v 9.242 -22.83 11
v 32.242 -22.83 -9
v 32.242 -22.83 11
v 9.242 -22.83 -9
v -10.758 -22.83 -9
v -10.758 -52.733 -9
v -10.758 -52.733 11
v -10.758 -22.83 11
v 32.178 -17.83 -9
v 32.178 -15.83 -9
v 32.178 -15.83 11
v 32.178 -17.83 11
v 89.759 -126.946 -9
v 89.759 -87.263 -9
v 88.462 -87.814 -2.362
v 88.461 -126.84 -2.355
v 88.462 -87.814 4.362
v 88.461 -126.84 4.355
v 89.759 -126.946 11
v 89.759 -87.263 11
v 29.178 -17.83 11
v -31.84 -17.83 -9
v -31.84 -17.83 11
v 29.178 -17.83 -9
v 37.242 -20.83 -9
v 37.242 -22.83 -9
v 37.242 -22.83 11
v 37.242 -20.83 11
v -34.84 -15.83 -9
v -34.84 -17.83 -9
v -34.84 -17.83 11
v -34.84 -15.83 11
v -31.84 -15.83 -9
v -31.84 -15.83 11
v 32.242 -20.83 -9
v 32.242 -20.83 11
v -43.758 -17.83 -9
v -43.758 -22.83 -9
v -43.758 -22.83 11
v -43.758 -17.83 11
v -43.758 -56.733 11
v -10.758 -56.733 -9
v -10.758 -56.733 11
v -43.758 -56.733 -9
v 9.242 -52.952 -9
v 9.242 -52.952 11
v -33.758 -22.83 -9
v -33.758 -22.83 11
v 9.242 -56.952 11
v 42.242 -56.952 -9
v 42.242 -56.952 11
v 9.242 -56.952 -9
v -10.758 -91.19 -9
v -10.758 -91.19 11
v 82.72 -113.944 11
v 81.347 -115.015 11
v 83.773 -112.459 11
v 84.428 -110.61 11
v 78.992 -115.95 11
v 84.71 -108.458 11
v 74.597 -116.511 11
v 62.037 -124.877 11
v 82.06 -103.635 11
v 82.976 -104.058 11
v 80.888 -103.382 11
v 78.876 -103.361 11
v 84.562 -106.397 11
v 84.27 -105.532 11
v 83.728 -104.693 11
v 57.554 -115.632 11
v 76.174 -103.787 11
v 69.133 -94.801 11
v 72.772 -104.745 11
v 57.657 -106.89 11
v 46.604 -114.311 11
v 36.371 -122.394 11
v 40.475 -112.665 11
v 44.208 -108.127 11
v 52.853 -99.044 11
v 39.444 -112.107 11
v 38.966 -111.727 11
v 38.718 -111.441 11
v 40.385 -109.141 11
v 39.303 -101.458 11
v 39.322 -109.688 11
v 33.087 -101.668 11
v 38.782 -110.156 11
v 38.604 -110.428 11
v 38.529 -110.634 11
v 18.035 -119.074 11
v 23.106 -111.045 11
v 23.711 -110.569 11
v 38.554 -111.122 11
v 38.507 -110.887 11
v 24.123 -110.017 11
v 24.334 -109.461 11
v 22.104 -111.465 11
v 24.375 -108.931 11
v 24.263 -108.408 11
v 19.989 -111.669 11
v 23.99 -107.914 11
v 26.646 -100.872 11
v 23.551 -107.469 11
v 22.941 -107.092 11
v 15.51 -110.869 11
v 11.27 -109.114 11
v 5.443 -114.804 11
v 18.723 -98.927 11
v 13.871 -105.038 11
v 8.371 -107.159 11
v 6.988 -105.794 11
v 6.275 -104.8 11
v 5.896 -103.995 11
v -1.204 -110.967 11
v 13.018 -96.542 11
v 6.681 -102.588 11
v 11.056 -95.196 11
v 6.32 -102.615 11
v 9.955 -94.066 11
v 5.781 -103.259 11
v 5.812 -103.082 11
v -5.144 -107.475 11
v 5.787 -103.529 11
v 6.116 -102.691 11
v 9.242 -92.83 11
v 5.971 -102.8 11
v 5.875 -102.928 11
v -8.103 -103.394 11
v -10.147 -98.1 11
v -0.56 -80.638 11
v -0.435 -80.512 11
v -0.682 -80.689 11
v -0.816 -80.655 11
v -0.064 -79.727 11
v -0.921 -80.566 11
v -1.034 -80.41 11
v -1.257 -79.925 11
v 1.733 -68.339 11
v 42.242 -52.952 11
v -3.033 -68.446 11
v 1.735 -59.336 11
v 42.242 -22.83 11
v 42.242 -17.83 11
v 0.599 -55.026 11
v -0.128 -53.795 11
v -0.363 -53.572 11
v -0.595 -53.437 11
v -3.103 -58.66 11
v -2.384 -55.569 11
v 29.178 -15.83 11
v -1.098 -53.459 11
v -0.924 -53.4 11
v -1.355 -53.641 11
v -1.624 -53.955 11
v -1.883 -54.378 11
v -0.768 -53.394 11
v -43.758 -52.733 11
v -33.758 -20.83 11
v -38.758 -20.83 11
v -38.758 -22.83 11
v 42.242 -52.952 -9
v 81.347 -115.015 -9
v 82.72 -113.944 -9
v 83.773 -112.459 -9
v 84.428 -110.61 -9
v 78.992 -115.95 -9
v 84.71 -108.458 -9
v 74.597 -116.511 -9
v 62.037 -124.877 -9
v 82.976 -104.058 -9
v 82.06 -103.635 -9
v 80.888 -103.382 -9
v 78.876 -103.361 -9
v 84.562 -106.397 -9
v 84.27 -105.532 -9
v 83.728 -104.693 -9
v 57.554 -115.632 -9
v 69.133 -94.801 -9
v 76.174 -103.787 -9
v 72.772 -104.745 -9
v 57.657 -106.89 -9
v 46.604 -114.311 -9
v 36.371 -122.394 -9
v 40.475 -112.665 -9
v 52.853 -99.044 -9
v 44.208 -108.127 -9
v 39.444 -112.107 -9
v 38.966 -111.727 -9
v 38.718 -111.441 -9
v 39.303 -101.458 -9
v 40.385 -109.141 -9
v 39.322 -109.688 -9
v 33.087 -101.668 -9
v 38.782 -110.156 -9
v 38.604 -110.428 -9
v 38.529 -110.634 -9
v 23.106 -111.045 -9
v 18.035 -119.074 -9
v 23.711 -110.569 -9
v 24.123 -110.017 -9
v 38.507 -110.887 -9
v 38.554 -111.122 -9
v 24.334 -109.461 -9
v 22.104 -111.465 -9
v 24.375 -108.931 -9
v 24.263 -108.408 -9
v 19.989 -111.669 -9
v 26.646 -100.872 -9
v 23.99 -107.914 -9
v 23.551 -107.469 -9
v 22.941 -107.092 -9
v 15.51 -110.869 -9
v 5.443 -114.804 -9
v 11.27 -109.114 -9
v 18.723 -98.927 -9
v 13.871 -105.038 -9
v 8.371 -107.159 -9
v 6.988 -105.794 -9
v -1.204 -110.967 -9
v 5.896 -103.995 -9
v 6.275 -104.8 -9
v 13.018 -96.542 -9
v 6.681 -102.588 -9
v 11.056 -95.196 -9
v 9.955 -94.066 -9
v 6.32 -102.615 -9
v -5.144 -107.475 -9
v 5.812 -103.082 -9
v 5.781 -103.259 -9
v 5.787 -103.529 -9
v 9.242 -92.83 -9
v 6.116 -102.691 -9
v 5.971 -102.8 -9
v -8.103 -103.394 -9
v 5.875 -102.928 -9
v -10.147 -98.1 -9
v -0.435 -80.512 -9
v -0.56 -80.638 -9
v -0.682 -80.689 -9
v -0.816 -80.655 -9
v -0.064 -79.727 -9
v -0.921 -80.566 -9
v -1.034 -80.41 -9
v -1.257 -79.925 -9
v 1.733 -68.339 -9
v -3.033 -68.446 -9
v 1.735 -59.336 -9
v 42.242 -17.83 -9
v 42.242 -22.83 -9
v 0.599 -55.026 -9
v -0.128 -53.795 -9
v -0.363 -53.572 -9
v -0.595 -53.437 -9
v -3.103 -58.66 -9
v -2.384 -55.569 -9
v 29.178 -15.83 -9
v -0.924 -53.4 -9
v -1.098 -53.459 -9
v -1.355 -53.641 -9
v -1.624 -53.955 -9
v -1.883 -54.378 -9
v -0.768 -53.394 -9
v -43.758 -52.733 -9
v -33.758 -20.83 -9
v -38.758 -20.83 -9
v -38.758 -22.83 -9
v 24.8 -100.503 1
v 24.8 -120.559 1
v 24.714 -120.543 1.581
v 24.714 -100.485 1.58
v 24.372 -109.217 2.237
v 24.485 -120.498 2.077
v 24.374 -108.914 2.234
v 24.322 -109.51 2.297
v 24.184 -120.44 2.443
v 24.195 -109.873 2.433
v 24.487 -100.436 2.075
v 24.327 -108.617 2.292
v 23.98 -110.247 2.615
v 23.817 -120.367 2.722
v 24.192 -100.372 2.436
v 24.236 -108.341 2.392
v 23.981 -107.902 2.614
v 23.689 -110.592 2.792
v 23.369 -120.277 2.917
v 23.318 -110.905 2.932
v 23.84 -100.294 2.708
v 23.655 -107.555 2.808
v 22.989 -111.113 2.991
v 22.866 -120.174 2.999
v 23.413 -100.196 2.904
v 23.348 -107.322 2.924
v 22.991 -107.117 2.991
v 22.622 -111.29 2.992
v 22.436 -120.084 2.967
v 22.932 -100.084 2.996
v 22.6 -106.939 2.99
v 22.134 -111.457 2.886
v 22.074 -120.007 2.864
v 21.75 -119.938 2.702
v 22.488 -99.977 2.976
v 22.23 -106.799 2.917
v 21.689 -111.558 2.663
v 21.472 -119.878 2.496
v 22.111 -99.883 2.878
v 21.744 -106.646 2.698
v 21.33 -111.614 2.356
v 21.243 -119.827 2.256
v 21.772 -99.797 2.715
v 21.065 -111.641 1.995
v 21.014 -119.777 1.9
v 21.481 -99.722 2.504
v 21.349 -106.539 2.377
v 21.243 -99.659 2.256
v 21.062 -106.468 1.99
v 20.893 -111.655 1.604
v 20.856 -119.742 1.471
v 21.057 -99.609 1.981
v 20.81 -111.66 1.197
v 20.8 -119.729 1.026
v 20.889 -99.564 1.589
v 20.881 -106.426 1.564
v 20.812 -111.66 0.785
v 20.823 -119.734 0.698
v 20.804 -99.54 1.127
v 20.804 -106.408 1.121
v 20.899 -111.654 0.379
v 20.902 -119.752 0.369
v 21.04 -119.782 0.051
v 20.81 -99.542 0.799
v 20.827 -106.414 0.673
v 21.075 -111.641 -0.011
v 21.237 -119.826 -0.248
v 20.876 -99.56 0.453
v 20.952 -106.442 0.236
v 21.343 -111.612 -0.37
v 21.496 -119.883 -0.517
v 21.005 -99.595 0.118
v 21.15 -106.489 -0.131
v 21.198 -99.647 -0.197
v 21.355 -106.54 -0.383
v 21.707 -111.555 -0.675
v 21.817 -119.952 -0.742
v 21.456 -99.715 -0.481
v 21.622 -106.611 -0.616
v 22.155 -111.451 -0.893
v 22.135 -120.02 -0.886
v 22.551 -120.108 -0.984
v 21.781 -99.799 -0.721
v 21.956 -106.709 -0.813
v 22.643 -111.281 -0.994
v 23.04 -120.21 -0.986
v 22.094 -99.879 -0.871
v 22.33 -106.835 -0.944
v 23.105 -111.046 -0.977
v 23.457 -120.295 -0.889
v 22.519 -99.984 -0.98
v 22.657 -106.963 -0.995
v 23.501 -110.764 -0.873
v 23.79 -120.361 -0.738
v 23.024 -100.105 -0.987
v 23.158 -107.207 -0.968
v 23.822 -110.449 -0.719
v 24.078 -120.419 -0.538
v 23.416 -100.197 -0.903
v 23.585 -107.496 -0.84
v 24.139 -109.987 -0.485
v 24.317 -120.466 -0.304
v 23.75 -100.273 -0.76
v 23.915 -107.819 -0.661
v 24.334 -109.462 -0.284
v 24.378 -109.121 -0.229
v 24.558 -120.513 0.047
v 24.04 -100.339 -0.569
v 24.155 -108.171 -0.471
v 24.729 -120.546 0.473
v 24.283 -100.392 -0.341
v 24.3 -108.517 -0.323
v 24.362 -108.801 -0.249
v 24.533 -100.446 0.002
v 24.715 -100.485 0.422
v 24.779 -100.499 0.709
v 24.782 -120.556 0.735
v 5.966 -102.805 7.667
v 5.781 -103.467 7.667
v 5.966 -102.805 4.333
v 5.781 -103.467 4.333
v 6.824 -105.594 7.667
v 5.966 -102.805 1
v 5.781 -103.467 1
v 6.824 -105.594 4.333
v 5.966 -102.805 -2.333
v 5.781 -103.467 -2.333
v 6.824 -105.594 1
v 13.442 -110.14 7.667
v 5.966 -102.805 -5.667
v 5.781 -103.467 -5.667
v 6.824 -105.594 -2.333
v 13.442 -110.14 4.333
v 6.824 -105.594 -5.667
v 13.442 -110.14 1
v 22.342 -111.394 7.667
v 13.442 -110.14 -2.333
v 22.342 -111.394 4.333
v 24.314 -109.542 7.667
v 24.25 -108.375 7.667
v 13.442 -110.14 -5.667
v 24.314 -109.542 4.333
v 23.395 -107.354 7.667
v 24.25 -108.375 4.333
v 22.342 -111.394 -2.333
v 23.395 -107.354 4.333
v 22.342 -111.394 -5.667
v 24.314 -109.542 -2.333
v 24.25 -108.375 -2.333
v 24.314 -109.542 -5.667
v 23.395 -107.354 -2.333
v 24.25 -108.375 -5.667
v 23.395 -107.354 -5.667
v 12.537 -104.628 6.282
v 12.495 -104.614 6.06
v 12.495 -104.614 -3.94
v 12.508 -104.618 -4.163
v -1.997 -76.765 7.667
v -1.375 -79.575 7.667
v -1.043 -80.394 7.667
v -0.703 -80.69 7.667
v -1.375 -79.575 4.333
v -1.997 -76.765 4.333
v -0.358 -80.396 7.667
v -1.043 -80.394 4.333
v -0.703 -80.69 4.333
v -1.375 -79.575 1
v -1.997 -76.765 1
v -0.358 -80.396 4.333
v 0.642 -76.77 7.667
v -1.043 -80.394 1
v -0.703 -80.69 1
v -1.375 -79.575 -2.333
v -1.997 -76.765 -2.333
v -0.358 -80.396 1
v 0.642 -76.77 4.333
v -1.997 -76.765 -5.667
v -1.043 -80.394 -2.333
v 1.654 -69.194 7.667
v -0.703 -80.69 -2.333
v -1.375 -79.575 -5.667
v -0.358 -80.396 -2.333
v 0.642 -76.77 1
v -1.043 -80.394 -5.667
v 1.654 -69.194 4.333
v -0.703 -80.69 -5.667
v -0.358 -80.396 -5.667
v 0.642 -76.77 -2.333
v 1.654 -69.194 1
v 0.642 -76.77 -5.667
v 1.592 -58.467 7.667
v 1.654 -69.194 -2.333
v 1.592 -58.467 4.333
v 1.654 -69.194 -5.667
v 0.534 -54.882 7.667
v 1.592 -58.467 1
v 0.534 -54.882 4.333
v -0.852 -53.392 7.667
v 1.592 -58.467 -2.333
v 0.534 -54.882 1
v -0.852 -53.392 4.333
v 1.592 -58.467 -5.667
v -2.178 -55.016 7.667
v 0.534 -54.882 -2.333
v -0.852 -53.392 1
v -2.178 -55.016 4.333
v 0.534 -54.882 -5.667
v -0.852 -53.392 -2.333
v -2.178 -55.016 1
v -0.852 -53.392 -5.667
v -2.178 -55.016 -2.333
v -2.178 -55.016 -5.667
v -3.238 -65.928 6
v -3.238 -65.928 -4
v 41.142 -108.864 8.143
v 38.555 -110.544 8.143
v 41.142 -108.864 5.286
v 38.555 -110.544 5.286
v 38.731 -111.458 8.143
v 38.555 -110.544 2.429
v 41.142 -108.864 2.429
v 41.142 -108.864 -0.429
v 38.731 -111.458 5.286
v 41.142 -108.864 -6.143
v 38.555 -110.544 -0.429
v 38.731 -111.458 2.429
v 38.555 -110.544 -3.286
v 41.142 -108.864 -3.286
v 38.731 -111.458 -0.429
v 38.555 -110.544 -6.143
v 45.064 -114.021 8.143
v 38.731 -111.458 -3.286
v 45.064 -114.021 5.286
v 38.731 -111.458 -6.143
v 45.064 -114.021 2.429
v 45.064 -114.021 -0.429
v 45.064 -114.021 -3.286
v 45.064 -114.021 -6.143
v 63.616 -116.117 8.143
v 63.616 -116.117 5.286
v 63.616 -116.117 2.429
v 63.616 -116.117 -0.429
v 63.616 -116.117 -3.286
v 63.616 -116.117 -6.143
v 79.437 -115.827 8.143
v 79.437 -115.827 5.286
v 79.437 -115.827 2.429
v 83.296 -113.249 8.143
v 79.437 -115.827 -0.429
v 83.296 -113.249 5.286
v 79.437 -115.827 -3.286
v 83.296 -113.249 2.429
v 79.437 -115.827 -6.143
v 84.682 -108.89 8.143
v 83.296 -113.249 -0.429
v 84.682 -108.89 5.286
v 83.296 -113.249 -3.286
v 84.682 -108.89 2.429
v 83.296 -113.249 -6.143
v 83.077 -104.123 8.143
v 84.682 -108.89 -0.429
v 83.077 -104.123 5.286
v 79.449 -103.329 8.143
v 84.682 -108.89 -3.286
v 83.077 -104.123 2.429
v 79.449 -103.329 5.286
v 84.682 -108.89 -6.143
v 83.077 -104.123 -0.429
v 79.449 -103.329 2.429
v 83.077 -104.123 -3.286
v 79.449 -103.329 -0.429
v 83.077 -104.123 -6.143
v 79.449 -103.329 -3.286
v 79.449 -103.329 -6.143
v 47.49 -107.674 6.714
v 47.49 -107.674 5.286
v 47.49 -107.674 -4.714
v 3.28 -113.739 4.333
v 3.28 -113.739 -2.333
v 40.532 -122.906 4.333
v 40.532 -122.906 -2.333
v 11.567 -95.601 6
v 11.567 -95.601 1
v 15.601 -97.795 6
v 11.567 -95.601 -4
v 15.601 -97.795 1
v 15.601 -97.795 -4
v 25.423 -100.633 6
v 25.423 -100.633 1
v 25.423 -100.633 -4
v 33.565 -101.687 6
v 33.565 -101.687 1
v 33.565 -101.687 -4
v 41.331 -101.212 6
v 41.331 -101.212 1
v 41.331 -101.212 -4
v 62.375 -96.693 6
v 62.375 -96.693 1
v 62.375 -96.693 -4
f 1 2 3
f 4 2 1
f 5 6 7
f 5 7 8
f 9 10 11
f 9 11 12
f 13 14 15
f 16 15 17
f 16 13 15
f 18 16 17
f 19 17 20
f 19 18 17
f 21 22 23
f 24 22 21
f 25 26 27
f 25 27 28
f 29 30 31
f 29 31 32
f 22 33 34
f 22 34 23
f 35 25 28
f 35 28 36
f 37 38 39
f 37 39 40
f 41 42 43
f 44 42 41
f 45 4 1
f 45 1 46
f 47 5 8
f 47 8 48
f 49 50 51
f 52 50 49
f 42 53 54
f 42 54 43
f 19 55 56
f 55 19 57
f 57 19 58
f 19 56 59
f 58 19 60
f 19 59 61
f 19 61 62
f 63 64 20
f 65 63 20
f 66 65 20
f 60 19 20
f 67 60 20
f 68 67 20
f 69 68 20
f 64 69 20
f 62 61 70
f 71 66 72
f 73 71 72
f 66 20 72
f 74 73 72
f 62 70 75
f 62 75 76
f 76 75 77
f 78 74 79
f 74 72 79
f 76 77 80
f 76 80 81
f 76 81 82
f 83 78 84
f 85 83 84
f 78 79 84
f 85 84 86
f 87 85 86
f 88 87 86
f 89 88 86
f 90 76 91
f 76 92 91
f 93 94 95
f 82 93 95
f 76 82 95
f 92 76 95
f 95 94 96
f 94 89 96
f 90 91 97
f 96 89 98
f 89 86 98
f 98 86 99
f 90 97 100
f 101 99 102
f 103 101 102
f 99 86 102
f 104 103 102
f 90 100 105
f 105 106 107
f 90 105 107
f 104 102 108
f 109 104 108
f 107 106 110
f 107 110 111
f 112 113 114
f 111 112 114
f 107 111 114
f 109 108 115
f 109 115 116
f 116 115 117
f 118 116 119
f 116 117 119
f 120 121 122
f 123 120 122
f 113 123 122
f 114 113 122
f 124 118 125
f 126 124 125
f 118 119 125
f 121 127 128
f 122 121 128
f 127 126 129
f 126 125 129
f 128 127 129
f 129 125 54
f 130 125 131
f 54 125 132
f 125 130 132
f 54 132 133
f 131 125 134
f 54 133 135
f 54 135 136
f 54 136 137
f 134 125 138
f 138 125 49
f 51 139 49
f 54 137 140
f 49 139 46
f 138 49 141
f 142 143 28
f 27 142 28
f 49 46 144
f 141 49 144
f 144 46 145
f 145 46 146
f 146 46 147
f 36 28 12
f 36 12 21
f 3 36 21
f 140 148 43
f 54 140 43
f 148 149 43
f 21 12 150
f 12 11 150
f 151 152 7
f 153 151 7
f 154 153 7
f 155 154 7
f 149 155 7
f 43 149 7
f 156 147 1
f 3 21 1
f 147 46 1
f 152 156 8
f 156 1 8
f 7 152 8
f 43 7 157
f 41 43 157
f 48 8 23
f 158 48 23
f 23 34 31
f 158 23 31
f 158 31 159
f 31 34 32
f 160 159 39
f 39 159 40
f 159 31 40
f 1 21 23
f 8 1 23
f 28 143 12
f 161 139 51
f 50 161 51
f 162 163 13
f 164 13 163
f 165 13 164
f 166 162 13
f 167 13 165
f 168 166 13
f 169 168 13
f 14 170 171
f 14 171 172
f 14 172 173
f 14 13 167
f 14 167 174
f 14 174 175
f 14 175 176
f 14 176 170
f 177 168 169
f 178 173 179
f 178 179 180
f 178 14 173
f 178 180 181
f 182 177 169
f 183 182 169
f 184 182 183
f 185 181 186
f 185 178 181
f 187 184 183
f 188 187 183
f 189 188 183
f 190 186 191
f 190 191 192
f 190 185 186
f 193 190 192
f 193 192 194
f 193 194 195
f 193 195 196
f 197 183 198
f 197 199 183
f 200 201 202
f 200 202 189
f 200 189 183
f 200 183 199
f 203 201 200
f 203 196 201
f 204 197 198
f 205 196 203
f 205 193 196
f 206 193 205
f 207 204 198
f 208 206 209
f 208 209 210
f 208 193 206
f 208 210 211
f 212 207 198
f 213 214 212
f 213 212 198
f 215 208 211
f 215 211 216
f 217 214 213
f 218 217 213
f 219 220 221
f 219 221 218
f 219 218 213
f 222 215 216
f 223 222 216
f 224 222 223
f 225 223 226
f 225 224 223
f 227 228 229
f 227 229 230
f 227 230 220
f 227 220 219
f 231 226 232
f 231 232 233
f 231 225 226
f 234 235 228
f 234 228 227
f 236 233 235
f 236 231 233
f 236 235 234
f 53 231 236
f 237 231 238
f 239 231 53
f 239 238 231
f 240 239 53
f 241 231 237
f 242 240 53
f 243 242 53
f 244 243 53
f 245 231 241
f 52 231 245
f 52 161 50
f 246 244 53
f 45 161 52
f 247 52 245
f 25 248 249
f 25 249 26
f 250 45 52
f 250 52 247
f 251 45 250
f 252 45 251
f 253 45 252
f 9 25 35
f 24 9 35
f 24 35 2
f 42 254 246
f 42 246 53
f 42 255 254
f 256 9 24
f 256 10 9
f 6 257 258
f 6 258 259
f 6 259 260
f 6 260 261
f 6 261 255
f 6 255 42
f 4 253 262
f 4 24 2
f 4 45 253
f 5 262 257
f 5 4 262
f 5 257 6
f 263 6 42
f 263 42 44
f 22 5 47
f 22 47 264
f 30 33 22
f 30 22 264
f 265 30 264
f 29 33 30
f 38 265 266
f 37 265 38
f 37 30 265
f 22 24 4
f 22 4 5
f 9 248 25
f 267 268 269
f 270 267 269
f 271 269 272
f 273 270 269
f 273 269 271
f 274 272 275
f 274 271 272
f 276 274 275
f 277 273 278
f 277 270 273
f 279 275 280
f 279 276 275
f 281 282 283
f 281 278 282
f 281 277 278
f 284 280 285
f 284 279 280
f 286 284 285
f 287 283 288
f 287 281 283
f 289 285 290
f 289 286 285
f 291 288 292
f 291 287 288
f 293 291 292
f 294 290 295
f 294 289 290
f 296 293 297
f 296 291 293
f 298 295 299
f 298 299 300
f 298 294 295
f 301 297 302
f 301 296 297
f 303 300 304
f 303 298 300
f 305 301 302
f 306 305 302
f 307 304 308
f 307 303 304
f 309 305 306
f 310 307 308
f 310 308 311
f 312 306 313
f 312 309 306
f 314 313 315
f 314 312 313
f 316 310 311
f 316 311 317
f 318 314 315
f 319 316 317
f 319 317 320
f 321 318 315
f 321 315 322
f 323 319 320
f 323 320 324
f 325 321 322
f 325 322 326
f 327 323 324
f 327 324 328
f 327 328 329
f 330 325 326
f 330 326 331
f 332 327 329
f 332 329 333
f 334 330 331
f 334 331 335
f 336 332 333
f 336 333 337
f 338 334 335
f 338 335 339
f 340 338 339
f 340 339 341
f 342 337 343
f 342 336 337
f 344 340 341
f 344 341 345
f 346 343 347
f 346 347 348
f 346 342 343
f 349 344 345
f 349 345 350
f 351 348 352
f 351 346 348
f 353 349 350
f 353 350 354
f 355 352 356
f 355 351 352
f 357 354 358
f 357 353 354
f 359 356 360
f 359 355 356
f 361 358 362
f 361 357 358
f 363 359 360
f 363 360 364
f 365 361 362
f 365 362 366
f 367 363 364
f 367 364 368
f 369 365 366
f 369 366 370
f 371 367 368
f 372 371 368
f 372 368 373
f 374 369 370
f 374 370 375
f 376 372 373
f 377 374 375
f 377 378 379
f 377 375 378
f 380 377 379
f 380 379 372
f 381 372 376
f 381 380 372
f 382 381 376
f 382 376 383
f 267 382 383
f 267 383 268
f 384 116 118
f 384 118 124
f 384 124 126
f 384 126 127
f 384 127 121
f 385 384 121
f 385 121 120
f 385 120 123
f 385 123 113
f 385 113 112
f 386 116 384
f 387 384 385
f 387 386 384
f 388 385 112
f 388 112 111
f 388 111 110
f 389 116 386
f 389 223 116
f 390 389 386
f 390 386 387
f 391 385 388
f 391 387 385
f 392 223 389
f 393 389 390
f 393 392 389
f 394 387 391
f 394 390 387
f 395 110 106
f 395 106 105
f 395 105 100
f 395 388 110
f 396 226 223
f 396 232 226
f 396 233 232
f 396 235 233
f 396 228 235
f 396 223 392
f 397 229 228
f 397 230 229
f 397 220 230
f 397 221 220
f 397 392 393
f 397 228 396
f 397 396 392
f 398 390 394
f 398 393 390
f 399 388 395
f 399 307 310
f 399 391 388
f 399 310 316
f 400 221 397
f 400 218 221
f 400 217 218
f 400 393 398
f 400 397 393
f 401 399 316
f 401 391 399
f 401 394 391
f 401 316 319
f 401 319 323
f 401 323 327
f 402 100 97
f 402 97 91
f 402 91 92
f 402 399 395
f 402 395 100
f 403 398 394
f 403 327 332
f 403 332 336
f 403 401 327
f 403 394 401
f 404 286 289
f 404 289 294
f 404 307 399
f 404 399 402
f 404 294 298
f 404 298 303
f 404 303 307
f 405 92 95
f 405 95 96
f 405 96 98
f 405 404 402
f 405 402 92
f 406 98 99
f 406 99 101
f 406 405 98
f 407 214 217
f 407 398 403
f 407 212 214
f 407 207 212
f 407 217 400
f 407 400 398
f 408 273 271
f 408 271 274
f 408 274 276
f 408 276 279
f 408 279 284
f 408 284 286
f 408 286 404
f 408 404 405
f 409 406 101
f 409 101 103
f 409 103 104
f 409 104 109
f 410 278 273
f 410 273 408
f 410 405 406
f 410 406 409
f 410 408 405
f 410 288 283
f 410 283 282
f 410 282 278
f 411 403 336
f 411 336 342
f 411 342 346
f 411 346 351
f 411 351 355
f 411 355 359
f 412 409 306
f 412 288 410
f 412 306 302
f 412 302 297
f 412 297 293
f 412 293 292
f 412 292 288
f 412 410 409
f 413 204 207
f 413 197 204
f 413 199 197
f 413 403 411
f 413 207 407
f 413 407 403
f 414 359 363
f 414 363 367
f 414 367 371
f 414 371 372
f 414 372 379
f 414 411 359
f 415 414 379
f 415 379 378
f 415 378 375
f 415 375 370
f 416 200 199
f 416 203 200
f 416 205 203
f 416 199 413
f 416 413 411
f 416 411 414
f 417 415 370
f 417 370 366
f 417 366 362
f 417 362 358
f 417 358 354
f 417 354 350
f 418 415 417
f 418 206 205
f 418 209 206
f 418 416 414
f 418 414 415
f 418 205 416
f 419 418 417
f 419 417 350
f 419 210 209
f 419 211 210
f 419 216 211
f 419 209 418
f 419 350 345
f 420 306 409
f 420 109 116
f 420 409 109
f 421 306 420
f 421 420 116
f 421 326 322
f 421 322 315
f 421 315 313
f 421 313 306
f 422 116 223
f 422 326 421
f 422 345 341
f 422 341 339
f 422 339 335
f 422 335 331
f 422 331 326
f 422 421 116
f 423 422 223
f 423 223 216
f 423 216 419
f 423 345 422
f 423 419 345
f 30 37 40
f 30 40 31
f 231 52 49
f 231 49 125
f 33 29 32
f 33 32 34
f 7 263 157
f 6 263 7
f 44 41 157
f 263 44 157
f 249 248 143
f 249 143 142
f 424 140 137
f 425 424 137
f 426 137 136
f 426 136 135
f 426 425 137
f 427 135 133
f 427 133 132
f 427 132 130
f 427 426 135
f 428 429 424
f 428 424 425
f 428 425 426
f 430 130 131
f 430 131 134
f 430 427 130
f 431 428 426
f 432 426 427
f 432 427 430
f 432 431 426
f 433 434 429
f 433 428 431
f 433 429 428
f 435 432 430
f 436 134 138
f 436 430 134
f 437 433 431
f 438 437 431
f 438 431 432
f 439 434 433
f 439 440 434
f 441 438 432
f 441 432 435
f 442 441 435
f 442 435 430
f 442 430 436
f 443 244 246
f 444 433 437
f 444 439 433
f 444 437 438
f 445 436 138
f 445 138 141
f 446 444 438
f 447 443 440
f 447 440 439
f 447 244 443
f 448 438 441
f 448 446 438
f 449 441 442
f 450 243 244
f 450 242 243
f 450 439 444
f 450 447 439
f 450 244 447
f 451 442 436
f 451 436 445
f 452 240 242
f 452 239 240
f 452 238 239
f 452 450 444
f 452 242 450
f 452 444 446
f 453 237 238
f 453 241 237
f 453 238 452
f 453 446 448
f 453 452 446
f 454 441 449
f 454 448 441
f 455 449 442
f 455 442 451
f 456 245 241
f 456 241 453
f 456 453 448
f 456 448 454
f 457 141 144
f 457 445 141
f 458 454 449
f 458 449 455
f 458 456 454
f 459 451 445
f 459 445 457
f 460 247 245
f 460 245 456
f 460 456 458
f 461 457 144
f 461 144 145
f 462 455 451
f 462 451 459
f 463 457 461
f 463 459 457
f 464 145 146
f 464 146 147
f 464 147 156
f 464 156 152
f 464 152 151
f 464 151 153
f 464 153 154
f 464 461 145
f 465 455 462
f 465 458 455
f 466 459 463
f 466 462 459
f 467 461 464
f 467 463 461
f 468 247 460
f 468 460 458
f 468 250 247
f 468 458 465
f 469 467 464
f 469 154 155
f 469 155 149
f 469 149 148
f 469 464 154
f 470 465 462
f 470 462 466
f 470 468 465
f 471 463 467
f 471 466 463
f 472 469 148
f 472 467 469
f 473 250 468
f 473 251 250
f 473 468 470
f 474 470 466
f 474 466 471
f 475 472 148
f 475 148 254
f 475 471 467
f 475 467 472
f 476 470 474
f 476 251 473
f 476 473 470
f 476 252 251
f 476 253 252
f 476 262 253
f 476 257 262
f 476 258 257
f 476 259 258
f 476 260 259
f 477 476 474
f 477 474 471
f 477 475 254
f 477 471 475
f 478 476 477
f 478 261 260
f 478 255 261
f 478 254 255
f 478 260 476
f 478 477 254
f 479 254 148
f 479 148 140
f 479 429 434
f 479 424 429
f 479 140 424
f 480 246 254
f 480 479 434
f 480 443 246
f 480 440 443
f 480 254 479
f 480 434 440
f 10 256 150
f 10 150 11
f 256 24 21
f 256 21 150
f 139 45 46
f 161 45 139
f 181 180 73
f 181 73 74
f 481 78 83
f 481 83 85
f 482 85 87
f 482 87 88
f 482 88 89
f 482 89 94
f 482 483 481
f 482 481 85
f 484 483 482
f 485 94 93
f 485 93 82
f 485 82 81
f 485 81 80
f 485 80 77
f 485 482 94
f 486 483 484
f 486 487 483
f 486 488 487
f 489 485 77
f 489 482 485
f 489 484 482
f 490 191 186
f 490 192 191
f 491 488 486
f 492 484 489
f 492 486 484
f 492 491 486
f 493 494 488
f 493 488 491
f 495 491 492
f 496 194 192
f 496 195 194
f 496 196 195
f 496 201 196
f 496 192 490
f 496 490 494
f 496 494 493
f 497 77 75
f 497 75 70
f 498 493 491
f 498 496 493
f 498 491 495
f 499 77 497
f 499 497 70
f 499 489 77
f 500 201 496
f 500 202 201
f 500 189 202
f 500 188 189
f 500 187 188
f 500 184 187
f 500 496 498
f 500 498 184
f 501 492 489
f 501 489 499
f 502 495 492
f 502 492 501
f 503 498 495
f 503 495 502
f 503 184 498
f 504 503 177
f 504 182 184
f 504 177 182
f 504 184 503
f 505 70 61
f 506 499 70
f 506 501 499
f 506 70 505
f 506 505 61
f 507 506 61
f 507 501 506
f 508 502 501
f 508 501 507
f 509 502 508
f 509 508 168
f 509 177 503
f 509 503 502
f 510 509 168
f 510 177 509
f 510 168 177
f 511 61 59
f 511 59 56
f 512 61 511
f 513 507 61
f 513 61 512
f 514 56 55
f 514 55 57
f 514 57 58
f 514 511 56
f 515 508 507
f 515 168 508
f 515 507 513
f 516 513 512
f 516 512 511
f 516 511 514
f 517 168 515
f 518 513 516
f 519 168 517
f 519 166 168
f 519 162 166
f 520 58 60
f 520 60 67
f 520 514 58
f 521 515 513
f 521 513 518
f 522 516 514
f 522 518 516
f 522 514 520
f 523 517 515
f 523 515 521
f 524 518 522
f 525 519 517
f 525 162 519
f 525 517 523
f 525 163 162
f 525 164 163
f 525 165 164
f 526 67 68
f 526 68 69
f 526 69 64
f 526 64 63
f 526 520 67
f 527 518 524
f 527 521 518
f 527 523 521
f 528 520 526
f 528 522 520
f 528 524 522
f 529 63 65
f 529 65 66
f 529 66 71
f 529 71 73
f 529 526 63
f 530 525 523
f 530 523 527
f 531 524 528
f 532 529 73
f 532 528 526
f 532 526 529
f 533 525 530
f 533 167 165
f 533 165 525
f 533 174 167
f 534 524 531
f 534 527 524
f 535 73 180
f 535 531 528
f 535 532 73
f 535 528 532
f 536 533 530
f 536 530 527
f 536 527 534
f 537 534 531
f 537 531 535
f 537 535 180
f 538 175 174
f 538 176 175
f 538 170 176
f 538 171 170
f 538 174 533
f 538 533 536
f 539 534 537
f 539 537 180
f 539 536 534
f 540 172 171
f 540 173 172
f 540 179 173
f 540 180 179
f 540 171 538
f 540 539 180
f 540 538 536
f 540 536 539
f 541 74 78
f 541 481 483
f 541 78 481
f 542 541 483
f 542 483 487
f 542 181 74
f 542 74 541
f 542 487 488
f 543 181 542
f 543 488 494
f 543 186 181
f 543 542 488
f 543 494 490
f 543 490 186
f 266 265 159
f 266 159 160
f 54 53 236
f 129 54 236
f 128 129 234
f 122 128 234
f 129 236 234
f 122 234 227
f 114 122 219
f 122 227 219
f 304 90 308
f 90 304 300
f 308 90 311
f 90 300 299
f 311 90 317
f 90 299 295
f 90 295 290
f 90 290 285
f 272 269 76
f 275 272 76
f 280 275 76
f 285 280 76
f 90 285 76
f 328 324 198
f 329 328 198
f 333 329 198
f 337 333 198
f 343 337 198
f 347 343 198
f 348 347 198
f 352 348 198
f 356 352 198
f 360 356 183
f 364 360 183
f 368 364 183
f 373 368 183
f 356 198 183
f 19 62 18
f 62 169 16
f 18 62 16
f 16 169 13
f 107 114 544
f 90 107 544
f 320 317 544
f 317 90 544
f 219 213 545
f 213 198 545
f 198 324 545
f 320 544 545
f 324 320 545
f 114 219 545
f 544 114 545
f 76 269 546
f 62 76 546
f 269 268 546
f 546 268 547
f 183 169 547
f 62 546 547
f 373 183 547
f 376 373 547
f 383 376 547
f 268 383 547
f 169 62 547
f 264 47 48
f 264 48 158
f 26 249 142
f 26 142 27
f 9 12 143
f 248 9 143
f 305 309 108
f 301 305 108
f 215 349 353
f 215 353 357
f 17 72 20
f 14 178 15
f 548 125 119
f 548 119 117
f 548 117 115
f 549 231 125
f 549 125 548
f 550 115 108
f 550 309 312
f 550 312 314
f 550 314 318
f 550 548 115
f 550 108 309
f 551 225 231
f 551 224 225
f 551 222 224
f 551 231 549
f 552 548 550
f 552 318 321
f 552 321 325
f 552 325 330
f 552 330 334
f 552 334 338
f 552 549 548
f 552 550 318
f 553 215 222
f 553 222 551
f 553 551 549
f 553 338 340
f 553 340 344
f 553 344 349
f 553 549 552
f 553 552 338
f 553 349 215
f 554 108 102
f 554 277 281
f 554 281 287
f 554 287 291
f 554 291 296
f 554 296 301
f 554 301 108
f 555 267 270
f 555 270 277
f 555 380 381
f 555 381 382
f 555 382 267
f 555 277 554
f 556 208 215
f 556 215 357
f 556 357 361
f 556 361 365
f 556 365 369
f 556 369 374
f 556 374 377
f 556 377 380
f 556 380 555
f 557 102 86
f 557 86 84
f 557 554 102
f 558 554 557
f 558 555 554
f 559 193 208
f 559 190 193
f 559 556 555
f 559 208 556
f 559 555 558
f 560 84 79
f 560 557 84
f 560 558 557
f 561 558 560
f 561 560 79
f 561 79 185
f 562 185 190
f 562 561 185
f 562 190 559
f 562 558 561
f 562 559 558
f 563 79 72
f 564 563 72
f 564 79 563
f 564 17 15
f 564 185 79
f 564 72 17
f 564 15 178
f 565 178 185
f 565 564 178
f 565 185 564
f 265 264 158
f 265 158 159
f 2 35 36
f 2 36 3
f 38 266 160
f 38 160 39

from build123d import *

# Parameters (mm, degrees)
CYLINDER003_R     = 2
CYLINDER003_DEPTH = 34
CYLINDER001_R     = 35
CYLINDER001_DEPTH = 100
EXTRUDE_DEPTH     = 20


with BuildPart() as cylinder:
    # Cylinder003 → Cylinder003 (new body)
    with BuildSketch(Plane(origin=(22.8, -95.5, -10), x_dir=(1, 0, 0), z_dir=(0, -1, 0))):
        Circle(CYLINDER003_R)
    extrude(amount=CYLINDER003_DEPTH)


with BuildPart() as drain_pipe001:
    # Cylinder001 → Cylinder001 (new body)
    with BuildSketch(Plane(origin=(123.3, -155.1, -10), x_dir=(1, 0, 0), z_dir=(0, 1, 0))):
        Circle(CYLINDER001_R)
    extrude(amount=CYLINDER001_DEPTH)


with BuildPart() as bracket001:
    # Sketch → Extrude (new body)
    with BuildSketch(Plane.XY):
        with BuildLine():
            add(Edge.make_bspline(
                [(9.242186, -69.33), (10.827276, -73.429492), (27.615939, -78.307585), (39.639567, -78.576037), (61.810331, -73.662283), (78.850841, -68.509173), (91.035842, -63.211941)],
                knots=[0, 0, 0, 0, 0.25, 0.5, 0.75, 1, 1, 1, 1], degree=3))
            Line((91.035842, -63.211941), (91.035842, -59.315908))
            Line((91.035842, -59.315908), (93.754241, -59.315908))
            Line((93.754241, -59.315908), (93.754241, -54.315908))
            Line((93.754241, -54.315908), (91.035842, -54.315908))
            Line((91.035842, -54.315908), (91.035842, -48.629474))
            Line((91.035842, -48.629474), (101.035842, -48.629474))
            Line((101.035842, -48.629474), (101.035842, -118.629474))
            Line((101.035842, -118.629474), (91.035842, -118.629474))
            Line((91.035842, -118.629474), (91.035842, -111.113045))
            Line((91.035842, -111.113045), (93.035842, -111.113045))
            Line((93.035842, -111.113045), (93.035842, -106.113045))
            Line((93.035842, -106.113045), (91.035842, -106.113045))
            Line((91.035842, -106.113045), (91.035842, -103.551941))
            add(Edge.make_bspline(
                [(-10.757814, -67.690441), (-12.083879, -99.944803), (39.127542, -99.207941), (91.035842, -103.551941)],
                knots=[0, 0, 0, 0, 1, 1, 1, 1], degree=3))
            Line((-10.757814, -67.690441), (-10.757814, -33.233494))
            Line((-10.757814, -33.233494), (-43.757814, -33.233494))
            Line((-43.757814, -33.233494), (-43.757814, -29.233494))
            Line((-43.757814, -29.233494), (-10.757814, -29.233494))
            Line((-10.757814, -29.233494), (-10.757814, 0.67))
            Line((-10.757814, 0.67), (-33.757814, 0.67))
            Line((-33.757814, 0.67), (-33.757814, 2.67))
            Line((-33.757814, 2.67), (-38.757814, 2.67))
            Line((-38.757814, 2.67), (-38.757814, 0.67))
            Line((-38.757814, 0.67), (-43.757814, 0.67))
            Line((-43.757814, 0.67), (-43.757814, 5.67))
            Line((-43.757814, 5.67), (-34.839867, 5.67))
            Line((-34.839867, 5.67), (-34.839867, 7.67))
            Line((-34.839867, 7.67), (-31.839867, 7.67))
            Line((-31.839867, 7.67), (-31.839867, 5.67))
            Line((-31.839867, 5.67), (29.178112, 5.67))
            Line((29.178112, 5.67), (29.178112, 7.67))
            Line((29.178112, 7.67), (32.178112, 7.67))
            Line((32.178112, 7.67), (32.178112, 5.67))
            Line((32.178112, 5.67), (42.242186, 5.67))
            Line((42.242186, 5.67), (42.242186, 0.67))
            Line((42.242186, 0.67), (37.242186, 0.67))
            Line((37.242186, 0.67), (37.242186, 2.67))
            Line((37.242186, 2.67), (32.242186, 2.67))
            Line((32.242186, 2.67), (32.242186, 0.67))
            Line((32.242186, 0.67), (9.242186, 0.67))
            Line((9.242186, 0.67), (9.242186, -29.452103))
            Line((9.242186, -29.452103), (42.242186, -29.452103))
            Line((42.242186, -29.452103), (42.242186, -33.452103))
            Line((42.242186, -33.452103), (9.242186, -33.452103))
            Line((9.242186, -33.452103), (9.242186, -68.33))
            Line((9.242186, -68.33), (9.242186, -69.33))
        make_face()
        with BuildLine():
            add(Edge.make_bspline(
                [(72.772036, -81.244883), (61.907298, -83.518709), (44.997022, -83.622495), (35.956661, -86.948995), (42.507868, -90.846149), (64.396727, -92.790316), (81.603448, -93.692317), (85.812812, -86.400151), (84.09773, -77.499903), (72.772036, -81.244883)],
                knots=[0, 0, 0, 0, 0.142857, 0.285714, 0.428571, 0.571429, 0.714286, 0.857143, 1, 1, 1, 1], degree=3))
        make_face(mode=Mode.SUBTRACT)
        with BuildLine():
            add(Edge.make_bspline(
                [(6.680865, -79.088199), (5.355656, -79.021302), (5.761318, -81.971364), (12.7469, -87.131353), (23.903595, -89.345392), (25.68801, -82.851549), (13.712575, -82.372747), (8.006075, -79.155097), (6.680865, -79.088199)],
                knots=[0, 0, 0, 0, 0.166667, 0.333333, 0.5, 0.666667, 0.833333, 1, 1, 1, 1], degree=3))
        make_face(mode=Mode.SUBTRACT)
        with BuildLine():
            add(Edge.make_bspline(
                [(-3.10286, -35.159514), (-3.511571, -37.900968), (-3.351595, -43.912471), (-0.753571, -63.822318), (2.149884, -43.935464), (2.076024, -34.601457), (-0.899326, -27.463747), (-2.694148, -32.41806), (-3.10286, -35.159514)],
                knots=[0, 0, 0, 0, 0.166667, 0.333333, 0.5, 0.666667, 0.833333, 1, 1, 1, 1], degree=3))
        make_face(mode=Mode.SUBTRACT)
    extrude(amount=EXTRUDE_DEPTH)


with BuildPart() as bracket001_1:
    # Extrude placement: moved
    add(bracket001.part.moved(Location((0, -23.5, -20))))

    # Cut: cut drain pipe001
    add(drain_pipe001.part, mode=Mode.SUBTRACT)

    # Cut001: cut Cylinder
    add(cylinder.part, mode=Mode.SUBTRACT)


with BuildPart() as bracket001_2:
    # Cut001 placement: moved
    add(bracket001_1.part.moved(Location((0, 0, 11))))


solid = bracket001_2.part
